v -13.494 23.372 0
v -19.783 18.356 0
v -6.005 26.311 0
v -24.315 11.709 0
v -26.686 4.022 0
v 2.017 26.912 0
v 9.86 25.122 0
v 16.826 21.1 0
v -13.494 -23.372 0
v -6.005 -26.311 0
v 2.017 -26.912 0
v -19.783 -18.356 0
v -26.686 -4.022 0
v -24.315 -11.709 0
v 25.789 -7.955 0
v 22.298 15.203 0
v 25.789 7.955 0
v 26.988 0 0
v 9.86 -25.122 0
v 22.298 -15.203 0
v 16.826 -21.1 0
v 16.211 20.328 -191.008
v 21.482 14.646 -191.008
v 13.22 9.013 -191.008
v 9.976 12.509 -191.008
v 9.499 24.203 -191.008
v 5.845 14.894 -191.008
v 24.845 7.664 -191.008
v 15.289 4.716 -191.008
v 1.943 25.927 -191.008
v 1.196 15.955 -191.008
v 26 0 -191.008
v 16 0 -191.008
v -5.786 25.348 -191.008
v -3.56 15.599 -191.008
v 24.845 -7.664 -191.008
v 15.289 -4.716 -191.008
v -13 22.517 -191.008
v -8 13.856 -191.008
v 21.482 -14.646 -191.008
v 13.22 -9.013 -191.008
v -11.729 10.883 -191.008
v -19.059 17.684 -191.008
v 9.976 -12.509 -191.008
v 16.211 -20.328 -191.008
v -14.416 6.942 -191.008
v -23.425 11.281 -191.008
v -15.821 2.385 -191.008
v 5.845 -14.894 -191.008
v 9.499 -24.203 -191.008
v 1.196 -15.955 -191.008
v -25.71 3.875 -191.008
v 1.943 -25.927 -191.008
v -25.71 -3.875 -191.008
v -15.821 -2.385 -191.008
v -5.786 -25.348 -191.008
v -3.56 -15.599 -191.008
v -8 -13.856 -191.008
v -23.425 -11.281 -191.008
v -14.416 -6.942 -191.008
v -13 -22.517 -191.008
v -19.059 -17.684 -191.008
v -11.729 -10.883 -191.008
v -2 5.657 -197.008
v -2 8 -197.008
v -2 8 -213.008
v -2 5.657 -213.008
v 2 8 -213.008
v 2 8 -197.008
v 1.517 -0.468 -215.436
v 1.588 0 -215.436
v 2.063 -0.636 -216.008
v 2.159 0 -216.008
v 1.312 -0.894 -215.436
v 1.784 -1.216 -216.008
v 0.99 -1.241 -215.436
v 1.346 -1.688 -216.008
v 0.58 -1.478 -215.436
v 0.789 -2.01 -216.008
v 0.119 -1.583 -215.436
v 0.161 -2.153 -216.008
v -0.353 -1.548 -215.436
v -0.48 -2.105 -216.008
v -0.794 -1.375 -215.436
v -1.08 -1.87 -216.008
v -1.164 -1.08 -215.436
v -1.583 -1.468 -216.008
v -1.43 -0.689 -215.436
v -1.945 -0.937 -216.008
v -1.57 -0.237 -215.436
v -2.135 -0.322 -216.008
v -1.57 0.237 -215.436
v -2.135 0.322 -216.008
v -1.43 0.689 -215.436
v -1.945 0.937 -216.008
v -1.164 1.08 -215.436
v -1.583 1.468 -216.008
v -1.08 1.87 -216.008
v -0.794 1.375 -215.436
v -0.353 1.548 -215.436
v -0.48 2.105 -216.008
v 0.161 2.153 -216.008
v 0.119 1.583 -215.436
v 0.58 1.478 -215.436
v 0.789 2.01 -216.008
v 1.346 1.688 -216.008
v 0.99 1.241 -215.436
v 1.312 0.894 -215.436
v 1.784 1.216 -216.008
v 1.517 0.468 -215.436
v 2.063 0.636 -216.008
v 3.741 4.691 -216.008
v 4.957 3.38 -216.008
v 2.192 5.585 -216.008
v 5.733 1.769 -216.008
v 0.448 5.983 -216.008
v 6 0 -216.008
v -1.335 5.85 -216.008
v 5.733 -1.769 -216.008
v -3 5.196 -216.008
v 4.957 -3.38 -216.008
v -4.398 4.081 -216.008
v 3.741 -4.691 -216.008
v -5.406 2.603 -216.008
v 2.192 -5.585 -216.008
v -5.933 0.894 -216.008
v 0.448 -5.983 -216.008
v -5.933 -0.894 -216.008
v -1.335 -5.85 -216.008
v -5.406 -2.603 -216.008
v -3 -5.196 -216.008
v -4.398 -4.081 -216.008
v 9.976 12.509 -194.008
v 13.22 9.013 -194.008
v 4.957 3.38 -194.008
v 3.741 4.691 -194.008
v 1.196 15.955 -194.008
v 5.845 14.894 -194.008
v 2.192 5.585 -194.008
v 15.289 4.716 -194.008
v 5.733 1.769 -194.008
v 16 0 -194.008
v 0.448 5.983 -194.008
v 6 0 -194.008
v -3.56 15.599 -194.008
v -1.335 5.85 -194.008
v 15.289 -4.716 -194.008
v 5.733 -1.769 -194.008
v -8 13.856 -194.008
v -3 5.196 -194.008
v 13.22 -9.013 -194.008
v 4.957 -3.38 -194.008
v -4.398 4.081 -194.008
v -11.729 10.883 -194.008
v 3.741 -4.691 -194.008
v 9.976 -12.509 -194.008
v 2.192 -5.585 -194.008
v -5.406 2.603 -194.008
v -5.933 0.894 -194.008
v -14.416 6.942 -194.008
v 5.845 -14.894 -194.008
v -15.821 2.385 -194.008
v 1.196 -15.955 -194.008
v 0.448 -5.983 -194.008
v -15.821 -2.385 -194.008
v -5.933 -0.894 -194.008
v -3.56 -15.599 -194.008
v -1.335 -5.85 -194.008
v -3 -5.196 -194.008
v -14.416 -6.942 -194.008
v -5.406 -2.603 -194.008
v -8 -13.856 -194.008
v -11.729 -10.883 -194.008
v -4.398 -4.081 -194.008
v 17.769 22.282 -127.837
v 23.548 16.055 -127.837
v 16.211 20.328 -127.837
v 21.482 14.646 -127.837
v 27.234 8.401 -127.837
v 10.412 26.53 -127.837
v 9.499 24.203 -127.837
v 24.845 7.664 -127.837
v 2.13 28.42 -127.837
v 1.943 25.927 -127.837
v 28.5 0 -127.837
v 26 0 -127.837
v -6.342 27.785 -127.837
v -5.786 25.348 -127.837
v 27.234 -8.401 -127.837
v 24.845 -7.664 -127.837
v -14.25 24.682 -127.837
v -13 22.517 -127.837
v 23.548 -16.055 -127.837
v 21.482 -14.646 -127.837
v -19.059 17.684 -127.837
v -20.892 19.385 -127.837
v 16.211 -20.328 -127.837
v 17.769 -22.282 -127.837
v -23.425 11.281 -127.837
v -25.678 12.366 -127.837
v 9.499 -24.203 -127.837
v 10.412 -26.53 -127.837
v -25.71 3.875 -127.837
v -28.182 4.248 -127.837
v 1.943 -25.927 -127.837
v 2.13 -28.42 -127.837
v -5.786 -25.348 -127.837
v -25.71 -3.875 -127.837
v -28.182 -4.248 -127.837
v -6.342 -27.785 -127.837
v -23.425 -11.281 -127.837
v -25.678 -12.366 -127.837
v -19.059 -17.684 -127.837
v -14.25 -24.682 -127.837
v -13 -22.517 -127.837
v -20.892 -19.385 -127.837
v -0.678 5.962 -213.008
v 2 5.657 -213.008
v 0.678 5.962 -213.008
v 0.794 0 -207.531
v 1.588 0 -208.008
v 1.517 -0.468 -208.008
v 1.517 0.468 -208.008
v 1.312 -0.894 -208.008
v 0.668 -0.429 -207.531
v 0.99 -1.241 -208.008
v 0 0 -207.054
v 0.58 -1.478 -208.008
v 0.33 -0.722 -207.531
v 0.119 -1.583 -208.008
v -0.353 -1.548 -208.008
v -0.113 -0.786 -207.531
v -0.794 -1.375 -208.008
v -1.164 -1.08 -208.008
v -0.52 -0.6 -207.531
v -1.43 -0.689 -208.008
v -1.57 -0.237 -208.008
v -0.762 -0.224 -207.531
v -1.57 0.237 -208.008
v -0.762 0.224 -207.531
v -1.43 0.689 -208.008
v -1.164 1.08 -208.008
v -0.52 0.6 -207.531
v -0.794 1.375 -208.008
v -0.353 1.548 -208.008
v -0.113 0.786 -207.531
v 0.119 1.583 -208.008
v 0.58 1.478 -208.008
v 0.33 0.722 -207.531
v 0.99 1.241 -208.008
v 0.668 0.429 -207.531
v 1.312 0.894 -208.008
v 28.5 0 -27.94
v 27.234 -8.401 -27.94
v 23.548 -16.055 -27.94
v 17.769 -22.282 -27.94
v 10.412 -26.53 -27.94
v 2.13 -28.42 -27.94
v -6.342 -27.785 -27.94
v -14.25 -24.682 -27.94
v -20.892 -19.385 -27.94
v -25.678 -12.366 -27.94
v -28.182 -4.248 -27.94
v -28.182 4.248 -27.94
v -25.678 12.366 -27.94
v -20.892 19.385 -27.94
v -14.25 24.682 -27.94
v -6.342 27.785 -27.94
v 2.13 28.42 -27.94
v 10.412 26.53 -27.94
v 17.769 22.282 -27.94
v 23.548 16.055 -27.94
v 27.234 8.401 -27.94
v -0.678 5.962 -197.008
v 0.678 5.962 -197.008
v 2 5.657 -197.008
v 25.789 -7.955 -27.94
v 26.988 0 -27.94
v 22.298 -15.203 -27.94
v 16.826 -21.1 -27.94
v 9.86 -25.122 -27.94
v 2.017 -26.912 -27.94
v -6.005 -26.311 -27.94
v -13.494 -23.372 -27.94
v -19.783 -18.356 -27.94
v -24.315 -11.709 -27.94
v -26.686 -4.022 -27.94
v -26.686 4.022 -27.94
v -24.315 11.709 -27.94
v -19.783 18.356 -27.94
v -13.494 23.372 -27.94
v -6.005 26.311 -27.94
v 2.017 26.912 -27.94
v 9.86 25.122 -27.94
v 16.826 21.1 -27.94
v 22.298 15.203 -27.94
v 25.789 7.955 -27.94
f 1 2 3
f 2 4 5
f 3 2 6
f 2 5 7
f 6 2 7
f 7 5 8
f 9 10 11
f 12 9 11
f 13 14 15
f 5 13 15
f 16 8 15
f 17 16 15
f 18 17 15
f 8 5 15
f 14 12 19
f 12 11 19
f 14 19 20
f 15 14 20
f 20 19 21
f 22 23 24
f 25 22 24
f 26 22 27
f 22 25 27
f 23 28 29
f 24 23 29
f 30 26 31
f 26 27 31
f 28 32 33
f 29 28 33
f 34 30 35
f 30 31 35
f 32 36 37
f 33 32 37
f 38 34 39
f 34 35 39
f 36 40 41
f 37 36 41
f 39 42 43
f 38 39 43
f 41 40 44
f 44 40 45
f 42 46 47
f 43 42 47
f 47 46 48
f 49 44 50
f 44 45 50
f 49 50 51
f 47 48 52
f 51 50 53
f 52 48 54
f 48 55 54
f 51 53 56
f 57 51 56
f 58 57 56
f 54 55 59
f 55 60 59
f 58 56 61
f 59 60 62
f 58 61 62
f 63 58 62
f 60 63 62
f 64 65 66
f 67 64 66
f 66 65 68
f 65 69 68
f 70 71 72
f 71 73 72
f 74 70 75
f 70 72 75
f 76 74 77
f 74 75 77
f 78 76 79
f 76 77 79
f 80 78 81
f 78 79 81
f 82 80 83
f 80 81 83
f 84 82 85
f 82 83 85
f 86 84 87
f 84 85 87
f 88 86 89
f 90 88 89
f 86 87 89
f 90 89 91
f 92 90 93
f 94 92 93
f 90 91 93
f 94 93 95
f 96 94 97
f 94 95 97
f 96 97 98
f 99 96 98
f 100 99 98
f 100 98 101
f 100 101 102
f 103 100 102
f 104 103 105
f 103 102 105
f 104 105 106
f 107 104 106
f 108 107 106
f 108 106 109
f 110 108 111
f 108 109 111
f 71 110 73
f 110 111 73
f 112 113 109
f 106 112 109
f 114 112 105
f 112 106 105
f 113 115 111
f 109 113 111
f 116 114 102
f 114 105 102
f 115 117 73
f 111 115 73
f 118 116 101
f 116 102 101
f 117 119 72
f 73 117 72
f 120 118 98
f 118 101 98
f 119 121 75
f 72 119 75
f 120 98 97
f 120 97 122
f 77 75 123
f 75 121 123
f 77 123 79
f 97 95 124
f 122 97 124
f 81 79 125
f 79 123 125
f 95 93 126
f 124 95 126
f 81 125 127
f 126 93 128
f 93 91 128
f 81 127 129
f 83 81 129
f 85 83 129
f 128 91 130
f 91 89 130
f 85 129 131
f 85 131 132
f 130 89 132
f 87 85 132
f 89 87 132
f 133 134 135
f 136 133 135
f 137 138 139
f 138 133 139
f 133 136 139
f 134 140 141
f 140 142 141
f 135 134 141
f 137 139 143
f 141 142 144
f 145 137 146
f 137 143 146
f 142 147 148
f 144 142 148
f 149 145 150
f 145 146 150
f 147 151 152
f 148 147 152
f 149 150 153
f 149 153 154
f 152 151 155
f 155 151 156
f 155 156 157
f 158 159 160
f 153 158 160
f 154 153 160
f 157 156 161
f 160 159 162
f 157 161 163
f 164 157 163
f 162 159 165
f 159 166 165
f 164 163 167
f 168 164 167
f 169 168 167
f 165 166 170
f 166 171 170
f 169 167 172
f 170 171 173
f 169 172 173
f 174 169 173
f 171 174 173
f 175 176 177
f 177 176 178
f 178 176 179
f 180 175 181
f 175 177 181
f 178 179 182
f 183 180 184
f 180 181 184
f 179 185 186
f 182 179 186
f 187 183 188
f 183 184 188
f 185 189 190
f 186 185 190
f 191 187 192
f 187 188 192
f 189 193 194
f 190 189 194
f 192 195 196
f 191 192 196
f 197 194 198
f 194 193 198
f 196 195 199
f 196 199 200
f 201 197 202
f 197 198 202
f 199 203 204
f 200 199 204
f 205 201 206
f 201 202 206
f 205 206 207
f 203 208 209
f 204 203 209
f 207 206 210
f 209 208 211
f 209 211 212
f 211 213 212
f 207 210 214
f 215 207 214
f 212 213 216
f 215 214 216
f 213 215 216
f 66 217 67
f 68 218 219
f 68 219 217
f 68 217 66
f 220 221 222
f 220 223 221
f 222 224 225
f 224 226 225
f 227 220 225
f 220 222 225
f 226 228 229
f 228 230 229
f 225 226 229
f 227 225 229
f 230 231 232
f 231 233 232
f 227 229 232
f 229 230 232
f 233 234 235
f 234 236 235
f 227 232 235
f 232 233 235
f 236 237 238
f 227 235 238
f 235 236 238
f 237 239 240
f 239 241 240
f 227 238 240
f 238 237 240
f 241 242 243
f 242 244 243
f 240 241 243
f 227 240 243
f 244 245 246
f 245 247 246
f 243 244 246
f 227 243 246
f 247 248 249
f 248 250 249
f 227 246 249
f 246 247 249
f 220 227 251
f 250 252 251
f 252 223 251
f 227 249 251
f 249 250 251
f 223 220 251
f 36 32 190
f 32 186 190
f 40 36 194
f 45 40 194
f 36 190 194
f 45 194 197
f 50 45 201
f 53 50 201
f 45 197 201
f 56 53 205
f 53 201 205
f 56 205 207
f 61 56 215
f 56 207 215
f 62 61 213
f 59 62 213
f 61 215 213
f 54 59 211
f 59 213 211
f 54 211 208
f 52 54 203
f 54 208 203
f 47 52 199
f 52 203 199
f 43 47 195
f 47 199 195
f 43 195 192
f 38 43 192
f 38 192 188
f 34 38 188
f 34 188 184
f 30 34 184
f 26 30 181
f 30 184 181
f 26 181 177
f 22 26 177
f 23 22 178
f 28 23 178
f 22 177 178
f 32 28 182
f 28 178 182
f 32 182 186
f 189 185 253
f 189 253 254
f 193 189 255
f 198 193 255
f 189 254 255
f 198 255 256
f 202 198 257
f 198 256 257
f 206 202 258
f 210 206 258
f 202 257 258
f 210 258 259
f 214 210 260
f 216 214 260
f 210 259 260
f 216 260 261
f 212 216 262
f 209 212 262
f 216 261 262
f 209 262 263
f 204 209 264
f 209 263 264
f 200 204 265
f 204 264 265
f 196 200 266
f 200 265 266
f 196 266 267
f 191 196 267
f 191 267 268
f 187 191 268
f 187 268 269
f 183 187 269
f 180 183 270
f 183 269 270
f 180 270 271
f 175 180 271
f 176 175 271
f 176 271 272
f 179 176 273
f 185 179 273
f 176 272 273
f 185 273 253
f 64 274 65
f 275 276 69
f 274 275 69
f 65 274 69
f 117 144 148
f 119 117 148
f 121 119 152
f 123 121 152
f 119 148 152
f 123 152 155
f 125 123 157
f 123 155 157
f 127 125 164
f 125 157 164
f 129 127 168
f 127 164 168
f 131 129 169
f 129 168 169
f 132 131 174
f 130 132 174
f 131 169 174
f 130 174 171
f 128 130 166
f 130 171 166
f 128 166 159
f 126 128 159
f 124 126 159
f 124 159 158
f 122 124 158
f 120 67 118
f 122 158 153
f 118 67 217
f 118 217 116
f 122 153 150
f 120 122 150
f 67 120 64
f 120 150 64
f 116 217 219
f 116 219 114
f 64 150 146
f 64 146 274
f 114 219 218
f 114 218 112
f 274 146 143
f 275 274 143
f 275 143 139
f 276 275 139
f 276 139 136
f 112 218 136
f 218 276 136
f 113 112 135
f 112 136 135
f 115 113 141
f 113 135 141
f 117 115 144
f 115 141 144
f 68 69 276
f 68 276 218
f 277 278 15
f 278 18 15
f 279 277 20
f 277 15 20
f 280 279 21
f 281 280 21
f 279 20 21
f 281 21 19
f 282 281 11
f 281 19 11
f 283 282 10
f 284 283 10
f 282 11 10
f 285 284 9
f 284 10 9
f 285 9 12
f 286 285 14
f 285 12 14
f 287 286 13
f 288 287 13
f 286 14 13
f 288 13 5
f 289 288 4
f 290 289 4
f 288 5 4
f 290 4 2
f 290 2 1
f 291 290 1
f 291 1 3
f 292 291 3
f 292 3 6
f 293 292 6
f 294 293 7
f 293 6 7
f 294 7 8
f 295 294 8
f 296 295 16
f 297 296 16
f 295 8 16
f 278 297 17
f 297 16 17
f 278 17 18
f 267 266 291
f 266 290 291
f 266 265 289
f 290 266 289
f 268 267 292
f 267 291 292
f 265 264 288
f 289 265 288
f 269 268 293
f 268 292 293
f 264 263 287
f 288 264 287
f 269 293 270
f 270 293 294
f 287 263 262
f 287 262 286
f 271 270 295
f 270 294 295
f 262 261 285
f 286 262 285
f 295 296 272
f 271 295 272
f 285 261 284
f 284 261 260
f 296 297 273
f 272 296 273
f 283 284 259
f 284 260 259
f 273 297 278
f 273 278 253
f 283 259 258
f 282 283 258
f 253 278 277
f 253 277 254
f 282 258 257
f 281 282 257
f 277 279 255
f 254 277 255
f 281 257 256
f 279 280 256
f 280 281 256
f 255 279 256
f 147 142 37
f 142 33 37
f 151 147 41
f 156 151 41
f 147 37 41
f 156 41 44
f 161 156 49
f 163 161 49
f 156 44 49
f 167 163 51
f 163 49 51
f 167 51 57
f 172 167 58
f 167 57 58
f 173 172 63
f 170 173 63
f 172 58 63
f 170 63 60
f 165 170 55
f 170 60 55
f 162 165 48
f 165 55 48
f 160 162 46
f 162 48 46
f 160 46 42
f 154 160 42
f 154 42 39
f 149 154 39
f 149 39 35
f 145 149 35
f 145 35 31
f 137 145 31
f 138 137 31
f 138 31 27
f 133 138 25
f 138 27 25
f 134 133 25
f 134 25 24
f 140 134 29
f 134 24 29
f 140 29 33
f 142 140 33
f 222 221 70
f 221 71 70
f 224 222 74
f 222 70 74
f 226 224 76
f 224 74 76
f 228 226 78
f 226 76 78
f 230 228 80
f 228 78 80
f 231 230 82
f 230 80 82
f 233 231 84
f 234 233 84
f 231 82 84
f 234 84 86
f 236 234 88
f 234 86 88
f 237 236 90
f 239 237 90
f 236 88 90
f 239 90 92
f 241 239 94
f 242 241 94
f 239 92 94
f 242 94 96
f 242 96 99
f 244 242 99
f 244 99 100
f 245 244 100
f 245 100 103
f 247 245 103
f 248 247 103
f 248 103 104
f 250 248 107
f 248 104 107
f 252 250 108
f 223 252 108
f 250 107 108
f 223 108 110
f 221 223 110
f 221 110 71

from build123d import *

# Parameters (mm, degrees)
SKETCH2_W           = 16
SKETCH2_H           = 3.081282867
BOSS_EXTRUDE1_DEPTH = 2


with BuildPart() as part:
    # Sketch1 → Revolve1 (revolve)
    with BuildSketch(Plane(origin=(0, 0, 0), x_dir=(0, 0, -1), z_dir=(1, 0, 0)), mode=Mode.PRIVATE) as revolve1_sk:
        Polygon((0, 0), (207.054133767, 0), (208.008, 1.5875), (215.4365, 1.5875), (216.008, 2.159), (216.008, 6), (194.008, 6), (194.008, 16), (191.008, 16), (191.008, 26), (127.837178898, 26), (127.837178898, 28.5), (27.94, 28.5), (27.94, 26.9875), (0, 26.9875), align=None)
    revolve(revolve1_sk.sketch.rotate(Axis((0, 0, 10.8794825), (0, 0, -1)), 90), axis=Axis((0, 0, 10.8794825), (0, 0, -1)))

    # Sketch2 → Boss-Extrude1 (add, symmetric)
    with BuildSketch(Plane(origin=(0, 0, 0), x_dir=(0, 0, -1), z_dir=(1, 0, 0))):
        with Locations((205.008, 6.459358567)):
            Rectangle(SKETCH2_W, SKETCH2_H)
    extrude(amount=BOSS_EXTRUDE1_DEPTH, both=True)


solid = part.part
